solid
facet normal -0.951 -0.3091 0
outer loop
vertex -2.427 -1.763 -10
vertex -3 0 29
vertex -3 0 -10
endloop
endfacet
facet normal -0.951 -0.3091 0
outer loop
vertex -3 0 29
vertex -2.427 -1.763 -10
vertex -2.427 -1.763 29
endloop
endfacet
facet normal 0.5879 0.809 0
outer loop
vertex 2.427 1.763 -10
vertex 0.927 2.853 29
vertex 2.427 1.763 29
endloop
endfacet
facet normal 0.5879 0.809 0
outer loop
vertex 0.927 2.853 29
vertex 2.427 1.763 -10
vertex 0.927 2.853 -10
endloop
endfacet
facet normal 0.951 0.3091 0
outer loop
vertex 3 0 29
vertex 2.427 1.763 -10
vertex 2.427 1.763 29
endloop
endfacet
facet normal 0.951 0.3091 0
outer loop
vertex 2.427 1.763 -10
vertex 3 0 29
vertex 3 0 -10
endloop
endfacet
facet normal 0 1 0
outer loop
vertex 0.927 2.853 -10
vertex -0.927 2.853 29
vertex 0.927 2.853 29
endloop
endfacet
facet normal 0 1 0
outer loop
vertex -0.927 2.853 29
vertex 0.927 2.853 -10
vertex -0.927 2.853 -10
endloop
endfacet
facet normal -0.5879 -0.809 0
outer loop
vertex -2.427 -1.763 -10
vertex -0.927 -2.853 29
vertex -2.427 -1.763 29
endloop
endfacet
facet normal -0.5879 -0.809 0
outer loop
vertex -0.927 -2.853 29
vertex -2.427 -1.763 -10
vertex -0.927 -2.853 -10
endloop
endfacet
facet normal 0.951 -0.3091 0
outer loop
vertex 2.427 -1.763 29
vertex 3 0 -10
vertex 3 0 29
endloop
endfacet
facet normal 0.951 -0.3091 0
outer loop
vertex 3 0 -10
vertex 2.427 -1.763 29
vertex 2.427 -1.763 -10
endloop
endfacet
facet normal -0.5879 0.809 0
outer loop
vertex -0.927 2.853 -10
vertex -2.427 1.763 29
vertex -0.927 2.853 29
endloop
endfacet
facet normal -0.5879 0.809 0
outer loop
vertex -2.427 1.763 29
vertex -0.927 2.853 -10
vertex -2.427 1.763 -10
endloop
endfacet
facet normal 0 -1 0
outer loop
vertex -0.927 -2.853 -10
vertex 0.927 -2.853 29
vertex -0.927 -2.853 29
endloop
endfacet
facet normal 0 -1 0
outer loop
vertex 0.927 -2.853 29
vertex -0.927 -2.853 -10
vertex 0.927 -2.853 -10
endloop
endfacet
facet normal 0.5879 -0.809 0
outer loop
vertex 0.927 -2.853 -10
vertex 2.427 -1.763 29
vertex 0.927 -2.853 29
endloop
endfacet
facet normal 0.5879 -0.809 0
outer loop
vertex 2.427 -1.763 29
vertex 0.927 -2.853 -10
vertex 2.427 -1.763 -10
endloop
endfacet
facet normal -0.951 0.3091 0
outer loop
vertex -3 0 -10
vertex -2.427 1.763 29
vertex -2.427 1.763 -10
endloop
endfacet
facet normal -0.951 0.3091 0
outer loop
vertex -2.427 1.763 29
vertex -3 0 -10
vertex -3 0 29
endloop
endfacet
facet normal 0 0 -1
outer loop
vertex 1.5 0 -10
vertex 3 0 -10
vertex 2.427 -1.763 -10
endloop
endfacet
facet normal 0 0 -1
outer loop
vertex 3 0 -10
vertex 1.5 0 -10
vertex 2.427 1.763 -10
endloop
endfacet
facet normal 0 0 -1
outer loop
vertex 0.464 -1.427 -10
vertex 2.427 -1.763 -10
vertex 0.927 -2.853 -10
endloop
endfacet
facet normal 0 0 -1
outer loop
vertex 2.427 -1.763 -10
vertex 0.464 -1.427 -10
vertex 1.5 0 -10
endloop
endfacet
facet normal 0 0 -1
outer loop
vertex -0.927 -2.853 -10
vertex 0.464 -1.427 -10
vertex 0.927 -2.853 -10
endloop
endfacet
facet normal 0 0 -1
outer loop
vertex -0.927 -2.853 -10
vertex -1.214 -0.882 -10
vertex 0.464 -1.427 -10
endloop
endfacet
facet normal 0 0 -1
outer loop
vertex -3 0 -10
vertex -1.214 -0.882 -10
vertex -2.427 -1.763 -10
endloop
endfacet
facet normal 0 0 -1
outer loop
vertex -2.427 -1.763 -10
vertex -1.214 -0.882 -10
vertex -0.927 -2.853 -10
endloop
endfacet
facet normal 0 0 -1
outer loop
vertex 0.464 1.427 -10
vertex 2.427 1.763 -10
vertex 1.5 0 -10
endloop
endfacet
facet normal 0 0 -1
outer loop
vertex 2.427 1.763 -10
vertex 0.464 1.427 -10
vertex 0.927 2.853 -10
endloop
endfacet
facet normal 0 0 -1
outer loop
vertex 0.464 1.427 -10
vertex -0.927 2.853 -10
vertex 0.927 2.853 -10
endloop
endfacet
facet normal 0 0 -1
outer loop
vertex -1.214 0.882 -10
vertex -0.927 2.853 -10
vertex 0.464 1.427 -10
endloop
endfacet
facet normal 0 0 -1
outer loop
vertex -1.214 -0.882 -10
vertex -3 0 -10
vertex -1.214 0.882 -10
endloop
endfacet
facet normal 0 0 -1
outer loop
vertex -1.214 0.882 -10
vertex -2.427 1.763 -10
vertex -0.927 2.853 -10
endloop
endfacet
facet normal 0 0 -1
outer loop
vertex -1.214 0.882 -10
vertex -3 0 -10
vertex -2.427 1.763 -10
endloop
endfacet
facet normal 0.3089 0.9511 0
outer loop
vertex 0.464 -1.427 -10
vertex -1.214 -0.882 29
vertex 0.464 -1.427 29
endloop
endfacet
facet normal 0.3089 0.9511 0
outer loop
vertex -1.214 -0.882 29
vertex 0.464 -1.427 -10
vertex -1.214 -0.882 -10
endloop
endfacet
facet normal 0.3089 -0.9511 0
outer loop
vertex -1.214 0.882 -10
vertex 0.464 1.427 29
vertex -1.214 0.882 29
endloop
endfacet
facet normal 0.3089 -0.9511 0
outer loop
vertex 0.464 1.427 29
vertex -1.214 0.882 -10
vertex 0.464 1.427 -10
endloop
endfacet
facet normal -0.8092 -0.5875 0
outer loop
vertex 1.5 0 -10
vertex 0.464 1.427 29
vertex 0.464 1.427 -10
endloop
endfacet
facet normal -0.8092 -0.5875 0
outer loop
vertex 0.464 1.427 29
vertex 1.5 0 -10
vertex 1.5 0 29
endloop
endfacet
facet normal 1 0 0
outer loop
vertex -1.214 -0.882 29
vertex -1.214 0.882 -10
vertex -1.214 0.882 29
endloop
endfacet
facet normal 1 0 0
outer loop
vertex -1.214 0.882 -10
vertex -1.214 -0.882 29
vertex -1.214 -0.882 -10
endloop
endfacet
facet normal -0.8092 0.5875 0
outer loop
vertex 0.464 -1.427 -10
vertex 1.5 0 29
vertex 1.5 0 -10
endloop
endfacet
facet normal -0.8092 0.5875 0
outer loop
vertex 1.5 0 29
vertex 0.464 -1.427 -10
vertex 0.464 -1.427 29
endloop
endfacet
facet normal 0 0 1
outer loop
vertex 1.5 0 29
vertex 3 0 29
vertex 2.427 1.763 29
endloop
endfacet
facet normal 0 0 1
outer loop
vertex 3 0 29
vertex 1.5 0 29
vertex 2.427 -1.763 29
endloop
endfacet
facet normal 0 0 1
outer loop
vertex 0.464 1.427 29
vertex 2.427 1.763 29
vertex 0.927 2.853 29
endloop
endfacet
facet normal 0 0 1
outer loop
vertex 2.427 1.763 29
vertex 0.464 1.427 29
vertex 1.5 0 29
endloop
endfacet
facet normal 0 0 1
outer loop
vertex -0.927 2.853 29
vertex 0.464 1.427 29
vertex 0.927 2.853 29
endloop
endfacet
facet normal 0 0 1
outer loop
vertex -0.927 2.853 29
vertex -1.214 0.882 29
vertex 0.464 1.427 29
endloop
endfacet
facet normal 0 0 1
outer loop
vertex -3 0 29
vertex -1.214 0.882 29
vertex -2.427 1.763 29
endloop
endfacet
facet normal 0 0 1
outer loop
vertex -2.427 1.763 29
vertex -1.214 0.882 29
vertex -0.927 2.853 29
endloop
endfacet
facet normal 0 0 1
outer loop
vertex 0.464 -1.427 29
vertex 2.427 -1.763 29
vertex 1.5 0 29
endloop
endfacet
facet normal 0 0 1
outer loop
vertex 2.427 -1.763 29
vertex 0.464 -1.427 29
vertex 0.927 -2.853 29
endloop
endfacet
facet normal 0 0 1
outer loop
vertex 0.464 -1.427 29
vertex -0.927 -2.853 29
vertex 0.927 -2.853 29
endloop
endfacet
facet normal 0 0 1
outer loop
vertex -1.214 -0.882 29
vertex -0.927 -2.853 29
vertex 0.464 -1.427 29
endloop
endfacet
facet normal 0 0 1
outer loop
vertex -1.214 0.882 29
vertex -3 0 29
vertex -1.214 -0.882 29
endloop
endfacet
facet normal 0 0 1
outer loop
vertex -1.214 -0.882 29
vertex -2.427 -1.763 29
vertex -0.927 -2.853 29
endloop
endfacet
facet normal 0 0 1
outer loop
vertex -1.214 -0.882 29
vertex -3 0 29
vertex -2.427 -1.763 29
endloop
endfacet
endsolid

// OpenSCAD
// Parameters
thread_diameter_mm = 3; //[1.5:6:0.1]
length_mm = 20; //[10:40:0.5]
outer_diameter_mm = 6; //[3.5:12:0.5]
thread_length_top_mm = 20; //[0:20:0.5]
thread_length_bottom_mm = 0; //[0:20:0.5]
overlap_mm = 1; //[0.5:2:0.1]

// Single standoff/pillar solid (outer body with internal clearance)
module pillar_solid() {
  difference() {
    // Outer body
    cylinder(h=length_mm, r=outer_diameter_mm/2, center=true);

    // Internal clearance (overlapped slightly to avoid coincident faces)
    union() {
      if (thread_length_top_mm > 0)
        translate([0, 0,  length_mm/2 - (thread_length_top_mm + overlap_mm)/2])
          cylinder(h=thread_length_top_mm + overlap_mm, r=thread_diameter_mm/2, center=true);

      if (thread_length_bottom_mm > 0)
        translate([0, 0, -length_mm/2 + (thread_length_bottom_mm + overlap_mm)/2])
          cylinder(h=thread_length_bottom_mm + overlap_mm, r=thread_diameter_mm/2, center=true);
    }
  }
}

// Assembly: ensure physical attachment with 1mm overlap and union into one solid
module assembly() {
  union() {
    // Lower segment
    color("Silver") pillar_solid();

    // Upper segment: positioned to overlap by overlap_mm (no gap / no floating)
    // For center=true cylinders: required center-to-center distance = length_mm - overlap_mm
    translate([0, 0, length_mm - overlap_mm])
      color("DimGray") pillar_solid();
  }
}

assembly();
